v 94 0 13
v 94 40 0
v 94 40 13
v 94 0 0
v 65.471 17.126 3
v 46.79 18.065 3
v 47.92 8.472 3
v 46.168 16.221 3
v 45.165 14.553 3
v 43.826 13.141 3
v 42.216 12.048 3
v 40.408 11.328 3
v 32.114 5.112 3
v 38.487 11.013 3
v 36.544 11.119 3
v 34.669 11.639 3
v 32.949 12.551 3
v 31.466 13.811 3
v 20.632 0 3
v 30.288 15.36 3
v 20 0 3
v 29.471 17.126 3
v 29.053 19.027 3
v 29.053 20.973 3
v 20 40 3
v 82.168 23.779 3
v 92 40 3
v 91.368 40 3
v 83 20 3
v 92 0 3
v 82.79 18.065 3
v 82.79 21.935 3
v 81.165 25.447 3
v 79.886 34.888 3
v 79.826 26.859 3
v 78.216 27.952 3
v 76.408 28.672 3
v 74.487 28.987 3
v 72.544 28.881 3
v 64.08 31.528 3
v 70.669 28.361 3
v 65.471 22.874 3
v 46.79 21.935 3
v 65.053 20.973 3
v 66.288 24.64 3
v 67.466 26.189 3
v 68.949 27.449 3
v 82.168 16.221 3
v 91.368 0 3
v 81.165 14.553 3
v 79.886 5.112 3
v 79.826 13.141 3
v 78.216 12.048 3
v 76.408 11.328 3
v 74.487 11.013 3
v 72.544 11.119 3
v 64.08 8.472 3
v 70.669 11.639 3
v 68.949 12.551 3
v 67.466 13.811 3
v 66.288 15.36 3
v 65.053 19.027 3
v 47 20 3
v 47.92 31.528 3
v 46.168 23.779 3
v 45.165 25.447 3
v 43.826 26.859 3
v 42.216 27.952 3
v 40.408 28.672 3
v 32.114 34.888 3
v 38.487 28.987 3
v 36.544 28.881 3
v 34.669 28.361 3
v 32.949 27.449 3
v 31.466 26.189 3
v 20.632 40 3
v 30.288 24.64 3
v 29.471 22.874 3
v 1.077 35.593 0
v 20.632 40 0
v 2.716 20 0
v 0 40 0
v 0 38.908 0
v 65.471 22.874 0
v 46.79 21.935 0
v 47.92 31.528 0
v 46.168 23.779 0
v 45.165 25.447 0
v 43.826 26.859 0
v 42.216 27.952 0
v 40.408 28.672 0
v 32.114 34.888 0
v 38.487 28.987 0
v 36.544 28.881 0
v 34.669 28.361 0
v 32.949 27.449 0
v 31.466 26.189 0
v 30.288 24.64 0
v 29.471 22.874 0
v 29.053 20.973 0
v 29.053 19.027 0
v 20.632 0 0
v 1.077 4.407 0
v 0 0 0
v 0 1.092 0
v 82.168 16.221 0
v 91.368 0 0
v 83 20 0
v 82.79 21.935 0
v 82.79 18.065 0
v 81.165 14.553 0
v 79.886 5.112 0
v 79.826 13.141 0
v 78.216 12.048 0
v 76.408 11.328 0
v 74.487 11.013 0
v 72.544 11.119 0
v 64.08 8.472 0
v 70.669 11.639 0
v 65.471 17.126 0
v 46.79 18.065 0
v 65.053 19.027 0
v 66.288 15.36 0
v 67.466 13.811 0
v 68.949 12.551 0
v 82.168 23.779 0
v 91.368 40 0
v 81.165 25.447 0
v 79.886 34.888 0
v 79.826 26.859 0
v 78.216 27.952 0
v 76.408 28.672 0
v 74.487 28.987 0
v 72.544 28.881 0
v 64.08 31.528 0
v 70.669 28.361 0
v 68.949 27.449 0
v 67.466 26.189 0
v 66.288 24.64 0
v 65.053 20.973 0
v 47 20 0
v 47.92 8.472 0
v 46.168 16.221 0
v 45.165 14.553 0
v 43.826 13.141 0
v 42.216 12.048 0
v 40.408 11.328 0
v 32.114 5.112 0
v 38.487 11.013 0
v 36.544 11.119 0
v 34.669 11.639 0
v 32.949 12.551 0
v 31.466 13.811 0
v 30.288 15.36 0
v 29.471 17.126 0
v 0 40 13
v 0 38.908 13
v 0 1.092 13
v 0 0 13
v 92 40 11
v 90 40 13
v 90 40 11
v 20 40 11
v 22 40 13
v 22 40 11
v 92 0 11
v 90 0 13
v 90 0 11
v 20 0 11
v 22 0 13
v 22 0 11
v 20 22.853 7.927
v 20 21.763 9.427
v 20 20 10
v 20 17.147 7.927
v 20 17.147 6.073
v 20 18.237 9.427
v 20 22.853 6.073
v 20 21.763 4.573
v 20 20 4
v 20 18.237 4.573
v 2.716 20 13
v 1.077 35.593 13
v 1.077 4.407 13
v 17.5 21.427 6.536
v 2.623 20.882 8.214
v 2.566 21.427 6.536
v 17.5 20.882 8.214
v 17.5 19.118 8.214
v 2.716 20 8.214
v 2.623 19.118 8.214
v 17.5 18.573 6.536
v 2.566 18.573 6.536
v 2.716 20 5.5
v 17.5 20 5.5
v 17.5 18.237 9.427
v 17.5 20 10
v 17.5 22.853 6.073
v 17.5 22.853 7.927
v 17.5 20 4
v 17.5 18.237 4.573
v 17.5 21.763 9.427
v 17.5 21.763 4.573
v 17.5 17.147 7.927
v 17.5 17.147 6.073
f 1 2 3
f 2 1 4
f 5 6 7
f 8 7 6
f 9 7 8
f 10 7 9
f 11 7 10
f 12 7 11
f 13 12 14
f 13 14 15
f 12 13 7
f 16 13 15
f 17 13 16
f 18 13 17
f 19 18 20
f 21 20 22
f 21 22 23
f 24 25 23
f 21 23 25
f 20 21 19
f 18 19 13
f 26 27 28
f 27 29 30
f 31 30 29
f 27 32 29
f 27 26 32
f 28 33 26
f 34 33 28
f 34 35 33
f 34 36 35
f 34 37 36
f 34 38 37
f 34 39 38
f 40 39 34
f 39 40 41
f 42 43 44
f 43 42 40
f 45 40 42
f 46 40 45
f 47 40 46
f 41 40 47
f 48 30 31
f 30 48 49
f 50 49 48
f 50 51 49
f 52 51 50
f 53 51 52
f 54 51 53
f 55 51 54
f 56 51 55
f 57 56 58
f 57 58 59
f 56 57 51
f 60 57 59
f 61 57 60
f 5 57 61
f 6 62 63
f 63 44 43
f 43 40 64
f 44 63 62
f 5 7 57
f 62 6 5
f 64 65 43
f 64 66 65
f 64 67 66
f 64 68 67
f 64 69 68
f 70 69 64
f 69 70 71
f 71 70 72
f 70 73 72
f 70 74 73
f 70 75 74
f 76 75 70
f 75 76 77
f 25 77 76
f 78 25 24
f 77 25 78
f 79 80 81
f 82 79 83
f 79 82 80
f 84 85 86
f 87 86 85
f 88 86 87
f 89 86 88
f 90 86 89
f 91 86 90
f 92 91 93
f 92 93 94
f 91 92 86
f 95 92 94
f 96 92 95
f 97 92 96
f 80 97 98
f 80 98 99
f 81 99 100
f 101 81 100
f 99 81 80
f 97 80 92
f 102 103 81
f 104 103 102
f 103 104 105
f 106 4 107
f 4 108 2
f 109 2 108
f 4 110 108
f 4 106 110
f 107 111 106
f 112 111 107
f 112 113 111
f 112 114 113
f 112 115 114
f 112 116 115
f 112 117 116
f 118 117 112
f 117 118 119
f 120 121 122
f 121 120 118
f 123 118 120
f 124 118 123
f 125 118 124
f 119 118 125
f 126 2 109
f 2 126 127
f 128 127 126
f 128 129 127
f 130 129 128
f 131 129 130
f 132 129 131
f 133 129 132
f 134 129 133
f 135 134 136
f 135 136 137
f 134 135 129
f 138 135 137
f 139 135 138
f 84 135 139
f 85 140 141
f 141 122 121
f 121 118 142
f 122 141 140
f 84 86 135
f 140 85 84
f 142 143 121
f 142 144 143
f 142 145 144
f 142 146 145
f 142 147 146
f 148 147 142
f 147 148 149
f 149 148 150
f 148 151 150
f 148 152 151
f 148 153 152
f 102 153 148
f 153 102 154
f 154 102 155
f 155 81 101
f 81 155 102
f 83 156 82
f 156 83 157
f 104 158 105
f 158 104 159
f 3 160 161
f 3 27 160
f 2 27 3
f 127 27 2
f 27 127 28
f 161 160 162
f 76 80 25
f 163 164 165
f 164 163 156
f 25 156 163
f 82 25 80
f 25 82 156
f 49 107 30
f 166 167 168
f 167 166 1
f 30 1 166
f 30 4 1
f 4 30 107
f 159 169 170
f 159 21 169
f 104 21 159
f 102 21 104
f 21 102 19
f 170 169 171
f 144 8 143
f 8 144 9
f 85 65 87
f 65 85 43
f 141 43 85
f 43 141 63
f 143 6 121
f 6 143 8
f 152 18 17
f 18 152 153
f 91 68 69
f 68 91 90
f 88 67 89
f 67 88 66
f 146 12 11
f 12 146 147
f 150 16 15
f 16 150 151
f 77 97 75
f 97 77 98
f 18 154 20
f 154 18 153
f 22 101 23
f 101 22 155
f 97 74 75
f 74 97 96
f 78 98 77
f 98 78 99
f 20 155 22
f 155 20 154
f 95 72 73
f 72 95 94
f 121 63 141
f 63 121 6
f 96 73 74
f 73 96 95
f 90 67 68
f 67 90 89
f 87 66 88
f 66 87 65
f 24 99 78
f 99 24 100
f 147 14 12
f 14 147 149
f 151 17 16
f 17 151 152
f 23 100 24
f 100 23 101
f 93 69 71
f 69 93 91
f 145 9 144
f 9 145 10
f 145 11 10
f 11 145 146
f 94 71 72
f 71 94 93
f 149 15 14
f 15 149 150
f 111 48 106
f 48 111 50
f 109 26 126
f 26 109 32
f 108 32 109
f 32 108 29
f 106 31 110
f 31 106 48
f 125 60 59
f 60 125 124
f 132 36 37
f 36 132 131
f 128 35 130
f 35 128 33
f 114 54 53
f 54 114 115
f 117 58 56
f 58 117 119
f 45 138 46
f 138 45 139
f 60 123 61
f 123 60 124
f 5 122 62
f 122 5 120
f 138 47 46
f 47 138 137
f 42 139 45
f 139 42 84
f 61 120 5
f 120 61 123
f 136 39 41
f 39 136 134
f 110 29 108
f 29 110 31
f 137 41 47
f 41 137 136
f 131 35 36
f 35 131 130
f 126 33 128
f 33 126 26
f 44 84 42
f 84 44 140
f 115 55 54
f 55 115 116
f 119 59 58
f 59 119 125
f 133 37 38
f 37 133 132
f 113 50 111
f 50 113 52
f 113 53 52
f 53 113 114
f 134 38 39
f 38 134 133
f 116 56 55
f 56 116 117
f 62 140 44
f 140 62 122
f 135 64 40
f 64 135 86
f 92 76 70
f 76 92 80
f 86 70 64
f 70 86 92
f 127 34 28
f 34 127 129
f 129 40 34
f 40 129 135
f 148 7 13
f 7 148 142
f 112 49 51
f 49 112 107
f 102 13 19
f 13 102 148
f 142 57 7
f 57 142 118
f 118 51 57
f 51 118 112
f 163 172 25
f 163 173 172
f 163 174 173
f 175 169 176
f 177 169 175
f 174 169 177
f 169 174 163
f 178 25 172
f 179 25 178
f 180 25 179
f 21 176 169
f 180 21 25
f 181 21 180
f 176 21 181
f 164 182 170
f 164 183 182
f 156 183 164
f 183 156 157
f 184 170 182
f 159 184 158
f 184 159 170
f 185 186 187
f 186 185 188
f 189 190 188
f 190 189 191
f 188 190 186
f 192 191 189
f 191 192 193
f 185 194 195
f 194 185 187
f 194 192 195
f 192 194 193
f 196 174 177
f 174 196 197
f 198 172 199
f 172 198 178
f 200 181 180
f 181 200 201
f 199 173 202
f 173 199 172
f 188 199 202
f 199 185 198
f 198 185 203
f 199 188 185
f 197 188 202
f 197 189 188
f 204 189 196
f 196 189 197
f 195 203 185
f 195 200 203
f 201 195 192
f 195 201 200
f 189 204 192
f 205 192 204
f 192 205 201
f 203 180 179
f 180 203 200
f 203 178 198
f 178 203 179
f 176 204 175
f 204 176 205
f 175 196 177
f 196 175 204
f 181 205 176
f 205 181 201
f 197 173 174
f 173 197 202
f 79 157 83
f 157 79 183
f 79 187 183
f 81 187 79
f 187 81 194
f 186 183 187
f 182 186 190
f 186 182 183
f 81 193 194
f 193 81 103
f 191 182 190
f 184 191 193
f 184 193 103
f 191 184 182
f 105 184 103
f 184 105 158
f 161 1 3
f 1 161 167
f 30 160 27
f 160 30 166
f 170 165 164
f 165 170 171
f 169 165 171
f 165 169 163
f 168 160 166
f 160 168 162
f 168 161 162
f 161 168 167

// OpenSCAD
// phoneHolderForLamp.scad 

phoneWidth = 72;
phoneThickness = 8;
boltLength = 20;
holderWidth = 40;
holderThickness = 3;
lampDiameter = 150;

negOffset = -1;
lampOffset = sqrt(pow(lampDiameter/2,2)-pow(holderWidth/2,2));
rad = sqrt(pow(phoneWidth/2,2)+pow(phoneWidth/2*1.9,2));

difference() {
    union(){
        // Flat base
        difference() {
            cube ([phoneWidth+boltLength+2, holderWidth, holderThickness]);
            translate([boltLength+phoneWidth/4, holderWidth/2, negOffset])
                cylinder(h = holderThickness+2, r=phoneWidth/8);
            translate([boltLength+3*phoneWidth/4, holderWidth/2, negOffset])
                cylinder(h = holderThickness+2, r=phoneWidth/8);
            translate([boltLength+phoneWidth/2, holderWidth+phoneWidth/2*1.9, negOffset])
                cylinder(h = holderThickness+2, r=rad);
            translate([boltLength+phoneWidth/2, -phoneWidth/2*1.9, negOffset])
                cylinder(h = holderThickness+2, r=rad);
        }
        
        difference() {
            translate([0, 0, holderThickness])
                cube([boltLength, holderWidth, phoneThickness+2]);
            translate([negOffset, holderWidth/2, holderThickness+phoneThickness/2])
                    rotate([0,90,0])
                        cylinder(h = boltLength+2, r=1.5);
            translate([boltLength-2.5, holderWidth/2, holderThickness+phoneThickness/2])
                    rotate([0,90,0])
                        cylinder(h = 3, r=3);
        }
    }
    translate([-lampOffset, holderWidth/2, negOffset])
            cylinder(h = holderThickness+phoneThickness+4, r=lampDiameter/2);
}
translate([phoneWidth+boltLength, 0, holderThickness])
    cube ([2, holderWidth, phoneThickness+2]);

translate([boltLength, 0, holderThickness+phoneThickness])
    cube([2,holderWidth,2]);

translate([boltLength+phoneWidth-2, 0, holderThickness+phoneThickness])
    cube([2,holderWidth,2]);
        
        
